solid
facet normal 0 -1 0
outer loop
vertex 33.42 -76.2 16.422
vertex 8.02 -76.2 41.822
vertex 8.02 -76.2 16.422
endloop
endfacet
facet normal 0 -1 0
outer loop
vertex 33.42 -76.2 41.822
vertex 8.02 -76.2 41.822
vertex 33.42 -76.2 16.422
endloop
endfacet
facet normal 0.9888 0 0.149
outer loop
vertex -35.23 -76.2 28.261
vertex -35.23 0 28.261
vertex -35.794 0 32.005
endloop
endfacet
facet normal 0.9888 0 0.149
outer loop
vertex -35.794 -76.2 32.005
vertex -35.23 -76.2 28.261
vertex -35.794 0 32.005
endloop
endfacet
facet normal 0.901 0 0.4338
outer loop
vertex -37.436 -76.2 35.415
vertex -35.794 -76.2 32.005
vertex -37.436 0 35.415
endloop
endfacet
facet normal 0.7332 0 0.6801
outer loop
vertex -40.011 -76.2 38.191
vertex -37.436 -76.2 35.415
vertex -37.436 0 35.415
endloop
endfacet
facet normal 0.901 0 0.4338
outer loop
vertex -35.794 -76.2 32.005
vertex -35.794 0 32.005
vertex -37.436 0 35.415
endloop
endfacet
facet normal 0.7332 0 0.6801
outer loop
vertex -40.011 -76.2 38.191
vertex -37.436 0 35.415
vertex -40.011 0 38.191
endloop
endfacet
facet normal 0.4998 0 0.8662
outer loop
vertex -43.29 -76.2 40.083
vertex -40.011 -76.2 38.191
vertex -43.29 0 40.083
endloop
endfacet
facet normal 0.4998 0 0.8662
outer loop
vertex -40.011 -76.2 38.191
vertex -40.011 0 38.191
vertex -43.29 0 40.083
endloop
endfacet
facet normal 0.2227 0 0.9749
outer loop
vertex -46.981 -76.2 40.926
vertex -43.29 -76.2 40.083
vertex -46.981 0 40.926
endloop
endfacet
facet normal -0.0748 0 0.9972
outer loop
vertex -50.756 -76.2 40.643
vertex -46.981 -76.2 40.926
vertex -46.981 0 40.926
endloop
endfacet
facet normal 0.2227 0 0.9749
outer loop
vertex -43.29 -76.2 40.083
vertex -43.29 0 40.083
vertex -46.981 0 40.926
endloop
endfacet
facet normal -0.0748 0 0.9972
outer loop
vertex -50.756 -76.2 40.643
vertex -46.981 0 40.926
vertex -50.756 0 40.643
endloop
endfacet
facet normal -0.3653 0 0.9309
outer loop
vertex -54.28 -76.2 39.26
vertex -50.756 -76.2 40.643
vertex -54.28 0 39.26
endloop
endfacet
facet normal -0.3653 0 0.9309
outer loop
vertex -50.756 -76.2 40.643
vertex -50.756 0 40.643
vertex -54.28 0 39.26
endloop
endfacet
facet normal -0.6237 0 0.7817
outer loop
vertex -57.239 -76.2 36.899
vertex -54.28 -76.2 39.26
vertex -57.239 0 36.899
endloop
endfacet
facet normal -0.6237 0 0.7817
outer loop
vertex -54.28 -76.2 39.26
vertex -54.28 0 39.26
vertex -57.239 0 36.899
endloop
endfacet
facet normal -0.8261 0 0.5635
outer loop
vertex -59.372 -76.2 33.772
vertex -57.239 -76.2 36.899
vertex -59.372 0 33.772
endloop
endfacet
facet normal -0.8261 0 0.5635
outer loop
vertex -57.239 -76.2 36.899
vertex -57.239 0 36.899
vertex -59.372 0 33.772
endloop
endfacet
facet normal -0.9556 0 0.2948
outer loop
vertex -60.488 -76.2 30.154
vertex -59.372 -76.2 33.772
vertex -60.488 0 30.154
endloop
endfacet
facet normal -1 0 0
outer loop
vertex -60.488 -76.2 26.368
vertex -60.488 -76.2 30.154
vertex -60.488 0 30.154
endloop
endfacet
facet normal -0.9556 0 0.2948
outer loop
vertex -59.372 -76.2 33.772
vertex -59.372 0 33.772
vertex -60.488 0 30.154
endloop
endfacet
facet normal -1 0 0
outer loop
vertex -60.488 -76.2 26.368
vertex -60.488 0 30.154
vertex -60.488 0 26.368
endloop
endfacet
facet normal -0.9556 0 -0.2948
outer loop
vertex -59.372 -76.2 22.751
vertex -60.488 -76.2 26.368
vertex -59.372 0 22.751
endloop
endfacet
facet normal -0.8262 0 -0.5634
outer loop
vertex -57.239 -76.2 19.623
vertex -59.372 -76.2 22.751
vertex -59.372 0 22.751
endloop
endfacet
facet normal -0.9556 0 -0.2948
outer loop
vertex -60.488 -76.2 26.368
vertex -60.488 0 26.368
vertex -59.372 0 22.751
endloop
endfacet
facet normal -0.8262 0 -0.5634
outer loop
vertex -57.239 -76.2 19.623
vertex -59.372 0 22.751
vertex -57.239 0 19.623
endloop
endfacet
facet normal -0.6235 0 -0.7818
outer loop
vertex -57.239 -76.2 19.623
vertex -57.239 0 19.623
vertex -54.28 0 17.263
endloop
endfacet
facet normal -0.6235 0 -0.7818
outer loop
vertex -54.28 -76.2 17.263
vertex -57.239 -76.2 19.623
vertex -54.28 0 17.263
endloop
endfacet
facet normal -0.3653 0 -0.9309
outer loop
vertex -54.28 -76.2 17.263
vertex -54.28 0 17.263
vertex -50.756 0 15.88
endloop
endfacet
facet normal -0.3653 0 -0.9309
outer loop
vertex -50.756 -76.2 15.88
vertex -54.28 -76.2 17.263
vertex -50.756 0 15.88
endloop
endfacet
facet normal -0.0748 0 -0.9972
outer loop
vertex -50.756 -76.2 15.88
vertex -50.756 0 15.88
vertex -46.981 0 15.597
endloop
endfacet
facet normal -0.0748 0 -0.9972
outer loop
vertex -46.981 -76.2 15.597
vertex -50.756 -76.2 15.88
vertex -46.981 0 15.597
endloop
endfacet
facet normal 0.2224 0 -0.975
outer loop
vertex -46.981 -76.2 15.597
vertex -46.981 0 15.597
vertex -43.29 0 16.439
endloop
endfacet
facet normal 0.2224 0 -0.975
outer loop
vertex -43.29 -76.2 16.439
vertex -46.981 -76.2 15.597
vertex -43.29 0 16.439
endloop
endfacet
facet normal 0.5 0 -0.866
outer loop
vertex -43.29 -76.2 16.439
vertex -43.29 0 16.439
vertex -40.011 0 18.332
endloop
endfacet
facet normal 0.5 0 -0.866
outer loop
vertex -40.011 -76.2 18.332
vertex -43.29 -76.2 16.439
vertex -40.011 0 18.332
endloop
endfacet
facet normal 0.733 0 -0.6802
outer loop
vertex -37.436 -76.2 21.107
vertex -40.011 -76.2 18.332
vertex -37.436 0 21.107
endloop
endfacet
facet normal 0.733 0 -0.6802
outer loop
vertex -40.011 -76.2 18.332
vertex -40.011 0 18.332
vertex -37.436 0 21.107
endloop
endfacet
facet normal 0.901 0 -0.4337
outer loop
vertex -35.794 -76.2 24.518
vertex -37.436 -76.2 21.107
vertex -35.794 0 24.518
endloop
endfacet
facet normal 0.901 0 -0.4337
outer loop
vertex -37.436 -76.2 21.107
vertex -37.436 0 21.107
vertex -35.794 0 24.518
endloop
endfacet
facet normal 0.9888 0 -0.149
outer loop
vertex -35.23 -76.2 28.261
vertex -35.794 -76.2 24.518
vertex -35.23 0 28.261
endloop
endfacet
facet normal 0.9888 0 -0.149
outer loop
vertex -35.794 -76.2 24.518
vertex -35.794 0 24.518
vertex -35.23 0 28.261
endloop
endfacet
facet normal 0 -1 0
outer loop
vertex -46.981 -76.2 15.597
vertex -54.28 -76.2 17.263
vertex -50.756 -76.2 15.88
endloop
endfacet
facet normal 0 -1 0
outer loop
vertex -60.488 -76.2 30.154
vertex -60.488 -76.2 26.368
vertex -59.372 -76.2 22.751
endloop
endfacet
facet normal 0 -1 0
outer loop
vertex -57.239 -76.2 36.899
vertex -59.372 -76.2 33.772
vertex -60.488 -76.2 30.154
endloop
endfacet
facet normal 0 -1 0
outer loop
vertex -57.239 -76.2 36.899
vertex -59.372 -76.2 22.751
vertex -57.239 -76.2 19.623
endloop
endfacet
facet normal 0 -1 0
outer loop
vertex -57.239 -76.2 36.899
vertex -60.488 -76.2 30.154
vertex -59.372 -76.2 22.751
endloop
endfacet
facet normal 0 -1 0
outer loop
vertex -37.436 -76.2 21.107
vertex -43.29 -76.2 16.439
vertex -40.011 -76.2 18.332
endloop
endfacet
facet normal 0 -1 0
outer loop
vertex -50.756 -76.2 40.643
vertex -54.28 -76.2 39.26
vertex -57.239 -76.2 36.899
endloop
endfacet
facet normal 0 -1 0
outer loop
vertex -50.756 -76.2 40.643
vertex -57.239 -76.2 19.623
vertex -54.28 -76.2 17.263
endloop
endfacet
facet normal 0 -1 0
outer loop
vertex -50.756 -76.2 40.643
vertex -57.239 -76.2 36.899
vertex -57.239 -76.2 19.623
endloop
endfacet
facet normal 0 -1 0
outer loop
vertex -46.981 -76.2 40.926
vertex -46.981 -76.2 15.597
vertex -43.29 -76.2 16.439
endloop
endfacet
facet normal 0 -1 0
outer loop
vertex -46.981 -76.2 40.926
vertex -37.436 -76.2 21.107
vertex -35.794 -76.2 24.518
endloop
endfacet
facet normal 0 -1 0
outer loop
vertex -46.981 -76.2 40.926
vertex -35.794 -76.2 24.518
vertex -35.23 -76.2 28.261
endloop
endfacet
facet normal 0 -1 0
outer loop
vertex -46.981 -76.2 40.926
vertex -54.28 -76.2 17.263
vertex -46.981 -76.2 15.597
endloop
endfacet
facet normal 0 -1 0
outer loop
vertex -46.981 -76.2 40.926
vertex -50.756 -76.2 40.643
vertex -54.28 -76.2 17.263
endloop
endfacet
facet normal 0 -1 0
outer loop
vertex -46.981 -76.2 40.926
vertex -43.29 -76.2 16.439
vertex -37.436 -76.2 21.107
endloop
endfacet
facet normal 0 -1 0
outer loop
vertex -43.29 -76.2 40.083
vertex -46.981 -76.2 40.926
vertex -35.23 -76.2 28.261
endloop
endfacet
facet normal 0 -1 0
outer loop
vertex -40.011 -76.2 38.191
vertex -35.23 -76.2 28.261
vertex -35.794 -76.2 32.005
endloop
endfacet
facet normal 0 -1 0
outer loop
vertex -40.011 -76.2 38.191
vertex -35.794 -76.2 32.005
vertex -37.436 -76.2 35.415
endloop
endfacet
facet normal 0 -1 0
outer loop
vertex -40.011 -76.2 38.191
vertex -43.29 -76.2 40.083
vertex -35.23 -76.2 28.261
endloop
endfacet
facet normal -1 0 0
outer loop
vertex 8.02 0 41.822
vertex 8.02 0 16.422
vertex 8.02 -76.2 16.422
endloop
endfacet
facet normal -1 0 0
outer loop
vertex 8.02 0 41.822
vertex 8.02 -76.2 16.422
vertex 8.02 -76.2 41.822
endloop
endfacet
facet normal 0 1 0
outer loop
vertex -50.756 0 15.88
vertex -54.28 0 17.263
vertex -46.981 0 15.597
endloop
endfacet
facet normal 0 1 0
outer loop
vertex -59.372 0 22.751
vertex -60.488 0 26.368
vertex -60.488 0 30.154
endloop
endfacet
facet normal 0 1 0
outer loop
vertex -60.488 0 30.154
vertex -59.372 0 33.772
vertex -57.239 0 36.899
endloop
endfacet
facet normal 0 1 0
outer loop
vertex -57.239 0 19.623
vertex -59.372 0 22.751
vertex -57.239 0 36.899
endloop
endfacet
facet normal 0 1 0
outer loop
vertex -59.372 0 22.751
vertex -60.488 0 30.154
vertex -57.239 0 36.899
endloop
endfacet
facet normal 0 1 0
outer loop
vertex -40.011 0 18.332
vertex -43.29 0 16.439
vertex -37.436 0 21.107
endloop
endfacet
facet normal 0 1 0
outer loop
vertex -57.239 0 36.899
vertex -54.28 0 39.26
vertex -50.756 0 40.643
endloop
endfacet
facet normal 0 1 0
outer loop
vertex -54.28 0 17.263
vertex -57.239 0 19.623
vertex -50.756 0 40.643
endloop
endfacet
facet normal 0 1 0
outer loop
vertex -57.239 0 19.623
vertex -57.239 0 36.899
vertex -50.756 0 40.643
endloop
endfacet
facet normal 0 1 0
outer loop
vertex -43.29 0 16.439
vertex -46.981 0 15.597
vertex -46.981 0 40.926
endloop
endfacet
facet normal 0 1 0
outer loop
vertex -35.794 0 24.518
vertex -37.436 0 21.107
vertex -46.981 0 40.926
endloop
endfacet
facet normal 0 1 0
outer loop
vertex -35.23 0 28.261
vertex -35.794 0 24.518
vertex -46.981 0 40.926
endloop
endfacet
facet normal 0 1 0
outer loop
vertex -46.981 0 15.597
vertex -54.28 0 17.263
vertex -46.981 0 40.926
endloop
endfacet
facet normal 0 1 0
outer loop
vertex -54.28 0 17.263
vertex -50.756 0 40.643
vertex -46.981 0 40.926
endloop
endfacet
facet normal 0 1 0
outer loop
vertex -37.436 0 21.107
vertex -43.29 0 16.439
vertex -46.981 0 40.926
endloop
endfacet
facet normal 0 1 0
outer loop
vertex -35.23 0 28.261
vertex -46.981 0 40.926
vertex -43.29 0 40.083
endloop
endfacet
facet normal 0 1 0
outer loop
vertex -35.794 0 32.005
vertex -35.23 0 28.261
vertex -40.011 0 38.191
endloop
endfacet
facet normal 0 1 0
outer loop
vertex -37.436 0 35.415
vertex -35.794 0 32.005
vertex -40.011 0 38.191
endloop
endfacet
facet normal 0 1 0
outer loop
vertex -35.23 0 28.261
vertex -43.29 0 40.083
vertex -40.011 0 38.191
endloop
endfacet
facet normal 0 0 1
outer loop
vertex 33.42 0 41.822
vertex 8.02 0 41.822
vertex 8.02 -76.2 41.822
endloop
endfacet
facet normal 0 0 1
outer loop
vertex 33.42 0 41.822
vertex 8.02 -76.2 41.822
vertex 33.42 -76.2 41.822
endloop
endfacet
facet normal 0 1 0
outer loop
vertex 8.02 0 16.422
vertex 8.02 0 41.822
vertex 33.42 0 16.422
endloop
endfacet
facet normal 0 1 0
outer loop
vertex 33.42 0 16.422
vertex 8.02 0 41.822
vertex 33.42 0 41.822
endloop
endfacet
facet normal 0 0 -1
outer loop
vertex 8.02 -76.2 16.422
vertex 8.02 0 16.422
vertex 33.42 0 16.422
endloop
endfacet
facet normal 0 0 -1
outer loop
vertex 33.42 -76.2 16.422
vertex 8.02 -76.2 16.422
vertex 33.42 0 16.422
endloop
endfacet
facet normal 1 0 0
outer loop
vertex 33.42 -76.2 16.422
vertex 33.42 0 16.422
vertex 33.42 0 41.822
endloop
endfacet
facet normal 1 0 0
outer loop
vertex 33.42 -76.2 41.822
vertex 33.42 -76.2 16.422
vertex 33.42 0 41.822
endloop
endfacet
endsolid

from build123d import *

# Parameters (mm, degrees)
F0_R     = 12.7
F0_W     = 25.4
F0_H     = 25.4
F1_DEPTH = 76.2


with BuildPart() as f1:
    # F0 (on Front) → F1 (new body)
    with BuildSketch(Plane.XZ):
        with Locations((-47.929619, 28.261289)):
            Circle(F0_R)
        with Locations((20.720096, 29.1221)):
            Rectangle(F0_W, F0_H)
    extrude(amount=F1_DEPTH)


solid = f1.part
